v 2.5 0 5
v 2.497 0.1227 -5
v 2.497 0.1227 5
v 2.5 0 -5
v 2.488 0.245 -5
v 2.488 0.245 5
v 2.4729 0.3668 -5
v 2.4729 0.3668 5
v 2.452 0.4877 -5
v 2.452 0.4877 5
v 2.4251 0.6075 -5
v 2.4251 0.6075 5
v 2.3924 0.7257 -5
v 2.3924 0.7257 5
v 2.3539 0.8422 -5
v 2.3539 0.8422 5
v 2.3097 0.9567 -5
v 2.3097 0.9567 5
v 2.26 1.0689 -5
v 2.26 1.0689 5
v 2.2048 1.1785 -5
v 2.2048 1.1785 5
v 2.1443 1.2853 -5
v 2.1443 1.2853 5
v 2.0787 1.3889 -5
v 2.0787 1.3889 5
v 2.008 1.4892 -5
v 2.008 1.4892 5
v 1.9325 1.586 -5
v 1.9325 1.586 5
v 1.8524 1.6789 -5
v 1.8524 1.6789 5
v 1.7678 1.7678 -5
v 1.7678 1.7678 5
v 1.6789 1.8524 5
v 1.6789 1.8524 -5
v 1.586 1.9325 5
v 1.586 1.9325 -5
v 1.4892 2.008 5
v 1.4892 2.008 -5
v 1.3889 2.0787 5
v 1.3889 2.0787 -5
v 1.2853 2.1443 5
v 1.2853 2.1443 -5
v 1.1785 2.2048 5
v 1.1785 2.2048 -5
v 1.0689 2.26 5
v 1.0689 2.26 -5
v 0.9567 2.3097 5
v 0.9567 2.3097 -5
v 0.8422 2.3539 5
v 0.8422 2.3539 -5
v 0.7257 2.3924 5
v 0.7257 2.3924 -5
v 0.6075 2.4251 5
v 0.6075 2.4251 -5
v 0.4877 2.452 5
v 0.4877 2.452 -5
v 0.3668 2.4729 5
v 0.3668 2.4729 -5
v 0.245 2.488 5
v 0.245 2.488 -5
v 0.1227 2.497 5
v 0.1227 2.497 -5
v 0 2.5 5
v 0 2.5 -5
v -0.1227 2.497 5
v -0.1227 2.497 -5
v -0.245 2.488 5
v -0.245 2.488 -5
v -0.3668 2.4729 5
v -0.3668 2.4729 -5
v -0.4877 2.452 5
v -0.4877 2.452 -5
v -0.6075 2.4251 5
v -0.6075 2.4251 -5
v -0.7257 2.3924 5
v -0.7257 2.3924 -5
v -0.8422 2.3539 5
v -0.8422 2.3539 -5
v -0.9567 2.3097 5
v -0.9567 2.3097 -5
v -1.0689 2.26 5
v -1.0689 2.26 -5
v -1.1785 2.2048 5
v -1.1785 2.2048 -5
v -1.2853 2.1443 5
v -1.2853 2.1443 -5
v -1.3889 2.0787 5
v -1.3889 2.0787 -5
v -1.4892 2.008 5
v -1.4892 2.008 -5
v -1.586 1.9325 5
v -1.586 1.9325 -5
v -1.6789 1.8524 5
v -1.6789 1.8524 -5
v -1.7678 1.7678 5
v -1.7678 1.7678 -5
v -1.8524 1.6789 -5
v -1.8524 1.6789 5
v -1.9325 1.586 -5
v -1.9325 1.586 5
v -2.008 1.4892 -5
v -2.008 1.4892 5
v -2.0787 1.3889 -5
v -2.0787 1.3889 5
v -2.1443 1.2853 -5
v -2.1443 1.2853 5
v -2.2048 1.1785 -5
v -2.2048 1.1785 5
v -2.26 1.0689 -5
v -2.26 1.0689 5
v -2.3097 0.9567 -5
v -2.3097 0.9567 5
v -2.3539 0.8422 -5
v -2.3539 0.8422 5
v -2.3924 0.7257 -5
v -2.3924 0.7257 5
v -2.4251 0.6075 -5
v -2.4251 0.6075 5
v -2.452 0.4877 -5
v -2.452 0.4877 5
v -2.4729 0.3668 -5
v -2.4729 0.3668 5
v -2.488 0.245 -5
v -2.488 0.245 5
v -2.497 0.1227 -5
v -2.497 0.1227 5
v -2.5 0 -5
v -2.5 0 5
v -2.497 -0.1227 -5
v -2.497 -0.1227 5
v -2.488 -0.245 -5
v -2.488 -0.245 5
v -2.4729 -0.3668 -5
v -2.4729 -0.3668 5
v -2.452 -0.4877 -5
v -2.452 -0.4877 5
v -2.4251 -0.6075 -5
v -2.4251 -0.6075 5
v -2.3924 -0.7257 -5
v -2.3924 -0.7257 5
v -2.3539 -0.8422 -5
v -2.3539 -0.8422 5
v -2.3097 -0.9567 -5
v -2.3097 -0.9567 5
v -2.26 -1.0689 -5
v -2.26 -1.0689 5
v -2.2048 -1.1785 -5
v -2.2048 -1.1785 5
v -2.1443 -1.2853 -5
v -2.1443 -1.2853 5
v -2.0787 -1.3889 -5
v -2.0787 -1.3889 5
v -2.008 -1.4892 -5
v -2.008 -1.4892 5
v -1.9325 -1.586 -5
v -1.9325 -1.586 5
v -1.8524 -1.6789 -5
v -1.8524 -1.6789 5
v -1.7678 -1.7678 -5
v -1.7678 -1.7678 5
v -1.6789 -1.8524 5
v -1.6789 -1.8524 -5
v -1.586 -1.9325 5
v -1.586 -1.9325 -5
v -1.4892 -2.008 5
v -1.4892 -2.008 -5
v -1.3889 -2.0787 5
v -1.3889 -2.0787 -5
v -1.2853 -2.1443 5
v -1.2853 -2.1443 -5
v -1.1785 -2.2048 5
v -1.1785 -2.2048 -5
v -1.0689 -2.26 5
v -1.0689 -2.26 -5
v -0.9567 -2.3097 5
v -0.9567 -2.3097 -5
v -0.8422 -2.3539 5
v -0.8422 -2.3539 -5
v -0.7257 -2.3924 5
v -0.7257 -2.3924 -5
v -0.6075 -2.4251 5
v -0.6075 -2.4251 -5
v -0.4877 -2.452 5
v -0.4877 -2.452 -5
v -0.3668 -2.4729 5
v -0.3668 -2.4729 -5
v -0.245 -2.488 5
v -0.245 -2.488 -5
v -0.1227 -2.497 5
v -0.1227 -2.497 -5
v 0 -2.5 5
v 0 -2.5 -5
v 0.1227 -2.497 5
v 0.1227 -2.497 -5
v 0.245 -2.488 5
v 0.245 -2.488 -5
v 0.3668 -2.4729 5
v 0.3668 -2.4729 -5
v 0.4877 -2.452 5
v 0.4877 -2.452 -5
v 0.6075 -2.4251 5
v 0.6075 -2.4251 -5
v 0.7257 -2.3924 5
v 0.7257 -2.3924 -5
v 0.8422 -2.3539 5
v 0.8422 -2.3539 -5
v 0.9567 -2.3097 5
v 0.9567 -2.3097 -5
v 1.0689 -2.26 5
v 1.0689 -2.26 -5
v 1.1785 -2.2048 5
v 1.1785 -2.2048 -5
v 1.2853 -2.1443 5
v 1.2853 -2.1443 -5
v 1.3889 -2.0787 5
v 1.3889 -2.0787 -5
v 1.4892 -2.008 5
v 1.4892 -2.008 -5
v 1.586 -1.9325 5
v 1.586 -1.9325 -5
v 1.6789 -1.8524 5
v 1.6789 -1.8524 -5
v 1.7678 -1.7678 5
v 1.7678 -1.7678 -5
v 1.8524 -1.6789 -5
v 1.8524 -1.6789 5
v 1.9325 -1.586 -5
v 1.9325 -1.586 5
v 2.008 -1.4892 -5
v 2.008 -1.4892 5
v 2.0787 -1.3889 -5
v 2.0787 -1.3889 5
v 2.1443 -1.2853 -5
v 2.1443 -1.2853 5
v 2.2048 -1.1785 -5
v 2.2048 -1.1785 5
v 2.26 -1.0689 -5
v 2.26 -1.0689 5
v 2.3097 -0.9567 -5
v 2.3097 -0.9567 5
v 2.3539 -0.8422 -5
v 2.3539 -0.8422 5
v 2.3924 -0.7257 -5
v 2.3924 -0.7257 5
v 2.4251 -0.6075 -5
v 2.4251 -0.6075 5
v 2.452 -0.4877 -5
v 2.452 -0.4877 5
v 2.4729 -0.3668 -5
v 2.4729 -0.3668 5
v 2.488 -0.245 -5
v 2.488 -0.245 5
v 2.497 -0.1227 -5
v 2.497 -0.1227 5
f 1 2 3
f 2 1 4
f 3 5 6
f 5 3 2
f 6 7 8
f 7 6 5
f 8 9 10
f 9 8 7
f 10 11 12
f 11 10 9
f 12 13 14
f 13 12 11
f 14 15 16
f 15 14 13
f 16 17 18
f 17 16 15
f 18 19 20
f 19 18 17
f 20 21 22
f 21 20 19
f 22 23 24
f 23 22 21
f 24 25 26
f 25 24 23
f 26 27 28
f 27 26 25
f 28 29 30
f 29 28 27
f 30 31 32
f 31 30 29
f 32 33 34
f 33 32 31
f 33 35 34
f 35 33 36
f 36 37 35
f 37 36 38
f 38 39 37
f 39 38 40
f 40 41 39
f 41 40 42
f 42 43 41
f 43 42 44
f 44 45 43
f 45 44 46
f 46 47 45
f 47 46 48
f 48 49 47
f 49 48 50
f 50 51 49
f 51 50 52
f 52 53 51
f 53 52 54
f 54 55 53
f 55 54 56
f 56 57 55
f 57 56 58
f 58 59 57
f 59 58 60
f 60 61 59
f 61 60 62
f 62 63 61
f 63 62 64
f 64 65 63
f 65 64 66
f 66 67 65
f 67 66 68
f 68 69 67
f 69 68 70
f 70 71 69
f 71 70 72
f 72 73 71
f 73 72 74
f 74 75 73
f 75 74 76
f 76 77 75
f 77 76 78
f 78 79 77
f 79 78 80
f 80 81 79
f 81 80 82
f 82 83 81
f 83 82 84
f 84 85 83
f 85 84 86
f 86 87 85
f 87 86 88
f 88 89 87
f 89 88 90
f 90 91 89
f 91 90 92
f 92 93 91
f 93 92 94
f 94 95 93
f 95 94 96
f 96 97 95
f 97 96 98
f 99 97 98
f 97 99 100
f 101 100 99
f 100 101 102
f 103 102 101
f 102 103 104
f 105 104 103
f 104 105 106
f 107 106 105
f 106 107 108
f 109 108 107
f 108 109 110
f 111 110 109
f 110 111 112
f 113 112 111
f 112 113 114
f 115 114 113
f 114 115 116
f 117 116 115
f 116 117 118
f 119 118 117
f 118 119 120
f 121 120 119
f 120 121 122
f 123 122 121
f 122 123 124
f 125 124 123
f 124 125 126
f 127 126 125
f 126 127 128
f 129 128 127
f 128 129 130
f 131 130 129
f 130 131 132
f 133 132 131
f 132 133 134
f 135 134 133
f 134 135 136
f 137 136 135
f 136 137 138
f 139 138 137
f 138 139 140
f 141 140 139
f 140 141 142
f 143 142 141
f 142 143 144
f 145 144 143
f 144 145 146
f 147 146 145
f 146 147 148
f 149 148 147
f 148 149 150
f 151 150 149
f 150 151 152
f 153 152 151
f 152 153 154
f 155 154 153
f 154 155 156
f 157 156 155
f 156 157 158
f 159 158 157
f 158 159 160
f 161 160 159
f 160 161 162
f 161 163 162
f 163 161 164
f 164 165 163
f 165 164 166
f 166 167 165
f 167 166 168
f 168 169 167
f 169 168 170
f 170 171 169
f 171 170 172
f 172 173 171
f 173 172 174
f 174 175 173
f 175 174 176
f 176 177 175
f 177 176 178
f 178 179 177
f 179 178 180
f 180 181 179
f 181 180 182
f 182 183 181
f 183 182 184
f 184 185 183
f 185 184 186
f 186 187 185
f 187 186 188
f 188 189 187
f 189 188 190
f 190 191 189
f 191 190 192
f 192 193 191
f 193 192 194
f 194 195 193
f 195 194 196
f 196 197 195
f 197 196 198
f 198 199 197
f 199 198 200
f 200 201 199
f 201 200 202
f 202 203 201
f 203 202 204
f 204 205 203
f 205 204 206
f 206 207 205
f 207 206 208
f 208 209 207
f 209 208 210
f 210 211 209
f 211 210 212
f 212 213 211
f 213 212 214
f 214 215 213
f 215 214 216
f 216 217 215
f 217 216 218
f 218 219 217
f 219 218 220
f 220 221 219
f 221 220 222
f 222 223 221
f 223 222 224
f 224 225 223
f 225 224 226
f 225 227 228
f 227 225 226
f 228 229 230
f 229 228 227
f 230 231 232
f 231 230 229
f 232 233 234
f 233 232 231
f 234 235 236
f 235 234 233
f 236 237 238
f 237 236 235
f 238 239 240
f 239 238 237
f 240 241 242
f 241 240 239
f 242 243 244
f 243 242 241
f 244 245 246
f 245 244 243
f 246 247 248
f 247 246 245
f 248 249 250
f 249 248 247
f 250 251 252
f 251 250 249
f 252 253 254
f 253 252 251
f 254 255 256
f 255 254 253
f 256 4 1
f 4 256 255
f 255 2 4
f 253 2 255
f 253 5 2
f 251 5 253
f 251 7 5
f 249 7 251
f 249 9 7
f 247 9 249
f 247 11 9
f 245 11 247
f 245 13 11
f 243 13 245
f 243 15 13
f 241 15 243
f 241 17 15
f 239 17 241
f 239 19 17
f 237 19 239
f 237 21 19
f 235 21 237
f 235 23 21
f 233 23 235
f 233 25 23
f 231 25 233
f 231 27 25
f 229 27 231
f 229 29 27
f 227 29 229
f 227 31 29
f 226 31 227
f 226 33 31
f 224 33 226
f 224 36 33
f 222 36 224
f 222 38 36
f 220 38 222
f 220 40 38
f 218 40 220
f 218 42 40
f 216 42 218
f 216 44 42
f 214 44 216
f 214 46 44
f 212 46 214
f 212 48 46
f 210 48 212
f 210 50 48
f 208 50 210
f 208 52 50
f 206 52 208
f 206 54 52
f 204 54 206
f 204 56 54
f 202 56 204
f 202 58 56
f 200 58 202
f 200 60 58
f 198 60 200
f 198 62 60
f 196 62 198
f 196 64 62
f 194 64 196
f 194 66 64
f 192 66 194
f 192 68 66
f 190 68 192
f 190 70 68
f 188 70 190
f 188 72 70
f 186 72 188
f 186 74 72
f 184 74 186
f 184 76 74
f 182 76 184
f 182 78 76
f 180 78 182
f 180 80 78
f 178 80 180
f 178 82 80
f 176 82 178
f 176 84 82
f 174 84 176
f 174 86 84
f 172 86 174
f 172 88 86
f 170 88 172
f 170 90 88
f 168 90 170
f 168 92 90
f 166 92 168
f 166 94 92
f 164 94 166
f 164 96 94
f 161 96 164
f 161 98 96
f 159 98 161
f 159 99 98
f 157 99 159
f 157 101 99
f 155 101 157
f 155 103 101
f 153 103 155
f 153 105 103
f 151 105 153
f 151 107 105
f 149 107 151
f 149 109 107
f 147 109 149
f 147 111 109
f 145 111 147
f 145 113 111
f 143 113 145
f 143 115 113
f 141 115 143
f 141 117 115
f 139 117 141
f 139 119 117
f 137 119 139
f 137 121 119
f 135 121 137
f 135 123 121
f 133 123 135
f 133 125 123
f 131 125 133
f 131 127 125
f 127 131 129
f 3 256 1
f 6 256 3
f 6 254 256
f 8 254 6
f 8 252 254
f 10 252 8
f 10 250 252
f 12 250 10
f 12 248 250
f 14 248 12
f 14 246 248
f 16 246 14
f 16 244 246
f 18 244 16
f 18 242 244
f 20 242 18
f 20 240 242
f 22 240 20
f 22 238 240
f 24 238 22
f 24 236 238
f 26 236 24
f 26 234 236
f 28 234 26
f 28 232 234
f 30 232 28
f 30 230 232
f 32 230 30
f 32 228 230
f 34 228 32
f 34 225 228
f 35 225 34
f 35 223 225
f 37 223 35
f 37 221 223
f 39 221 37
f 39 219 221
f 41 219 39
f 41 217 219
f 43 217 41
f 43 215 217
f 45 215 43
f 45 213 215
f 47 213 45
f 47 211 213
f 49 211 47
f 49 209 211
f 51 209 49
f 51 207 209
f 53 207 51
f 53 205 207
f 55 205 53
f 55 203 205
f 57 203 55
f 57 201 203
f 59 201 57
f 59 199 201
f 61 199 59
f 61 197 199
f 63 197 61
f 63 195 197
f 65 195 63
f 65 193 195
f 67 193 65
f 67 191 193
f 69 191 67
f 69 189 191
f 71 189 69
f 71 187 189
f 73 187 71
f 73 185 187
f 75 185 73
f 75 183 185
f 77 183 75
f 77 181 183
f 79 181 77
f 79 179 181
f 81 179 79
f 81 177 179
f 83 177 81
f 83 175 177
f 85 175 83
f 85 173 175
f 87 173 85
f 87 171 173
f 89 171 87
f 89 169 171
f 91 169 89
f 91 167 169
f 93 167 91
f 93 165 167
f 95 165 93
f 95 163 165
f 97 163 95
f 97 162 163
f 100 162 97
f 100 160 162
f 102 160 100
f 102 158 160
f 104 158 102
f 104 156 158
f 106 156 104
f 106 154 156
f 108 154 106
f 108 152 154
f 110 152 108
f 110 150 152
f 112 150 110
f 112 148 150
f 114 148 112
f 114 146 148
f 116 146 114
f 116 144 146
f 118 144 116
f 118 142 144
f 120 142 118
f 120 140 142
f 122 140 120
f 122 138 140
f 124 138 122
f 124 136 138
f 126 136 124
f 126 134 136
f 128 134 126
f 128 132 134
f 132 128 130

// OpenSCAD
// Simple cylinder test
$fn = 128;
cylinder(h = 10, d = 5.0, center = true);
